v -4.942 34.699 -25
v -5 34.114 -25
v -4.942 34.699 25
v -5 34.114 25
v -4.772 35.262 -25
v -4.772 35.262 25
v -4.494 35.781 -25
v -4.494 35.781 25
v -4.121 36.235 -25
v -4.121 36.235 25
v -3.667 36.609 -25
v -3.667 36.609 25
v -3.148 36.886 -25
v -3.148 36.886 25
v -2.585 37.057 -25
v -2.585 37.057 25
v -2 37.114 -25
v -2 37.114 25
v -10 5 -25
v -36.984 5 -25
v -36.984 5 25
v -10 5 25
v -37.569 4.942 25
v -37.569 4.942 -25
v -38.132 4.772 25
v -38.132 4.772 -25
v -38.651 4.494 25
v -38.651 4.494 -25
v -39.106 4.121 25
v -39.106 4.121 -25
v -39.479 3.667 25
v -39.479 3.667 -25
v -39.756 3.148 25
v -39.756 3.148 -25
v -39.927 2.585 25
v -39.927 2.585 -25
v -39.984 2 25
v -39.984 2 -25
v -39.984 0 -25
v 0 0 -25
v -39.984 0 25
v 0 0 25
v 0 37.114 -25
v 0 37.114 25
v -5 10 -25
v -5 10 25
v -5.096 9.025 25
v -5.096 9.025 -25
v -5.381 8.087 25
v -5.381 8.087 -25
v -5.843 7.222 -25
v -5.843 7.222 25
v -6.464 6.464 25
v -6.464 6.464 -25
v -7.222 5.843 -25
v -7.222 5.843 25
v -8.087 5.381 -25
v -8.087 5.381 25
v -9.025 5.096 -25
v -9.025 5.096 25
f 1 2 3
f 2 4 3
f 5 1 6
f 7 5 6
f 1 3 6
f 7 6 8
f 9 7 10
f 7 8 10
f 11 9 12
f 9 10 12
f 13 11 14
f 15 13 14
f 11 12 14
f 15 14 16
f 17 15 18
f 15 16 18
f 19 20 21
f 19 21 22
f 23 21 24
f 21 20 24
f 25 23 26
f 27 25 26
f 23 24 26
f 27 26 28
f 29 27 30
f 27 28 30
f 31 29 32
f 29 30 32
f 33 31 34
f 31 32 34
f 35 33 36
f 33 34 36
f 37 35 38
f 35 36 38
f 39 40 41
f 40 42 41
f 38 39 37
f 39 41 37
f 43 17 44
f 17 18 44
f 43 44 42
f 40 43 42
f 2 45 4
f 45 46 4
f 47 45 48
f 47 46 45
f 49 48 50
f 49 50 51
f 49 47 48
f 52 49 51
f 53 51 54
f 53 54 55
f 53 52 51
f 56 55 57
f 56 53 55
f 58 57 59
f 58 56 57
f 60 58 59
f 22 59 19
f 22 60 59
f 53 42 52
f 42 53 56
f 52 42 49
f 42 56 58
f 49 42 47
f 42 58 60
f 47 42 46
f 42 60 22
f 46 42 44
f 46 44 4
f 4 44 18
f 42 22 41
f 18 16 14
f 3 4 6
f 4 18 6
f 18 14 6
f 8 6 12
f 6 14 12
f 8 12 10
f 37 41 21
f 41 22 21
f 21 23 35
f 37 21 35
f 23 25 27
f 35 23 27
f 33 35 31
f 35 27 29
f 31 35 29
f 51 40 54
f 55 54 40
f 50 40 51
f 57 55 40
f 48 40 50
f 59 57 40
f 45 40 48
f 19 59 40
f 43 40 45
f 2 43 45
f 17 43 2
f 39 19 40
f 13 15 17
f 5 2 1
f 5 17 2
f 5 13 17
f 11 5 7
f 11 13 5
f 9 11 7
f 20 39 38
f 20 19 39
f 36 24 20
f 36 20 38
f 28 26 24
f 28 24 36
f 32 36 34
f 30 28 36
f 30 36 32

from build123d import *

# Parameters (mm, degrees)
PAD_DEPTH   = 25
FILLET_R    = 3
FILLET001_R = 3
FILLET002_R = 5


with BuildPart() as part:
    # Sketch → Pad (new body, symmetric)
    with BuildSketch(Plane.XY):
        Polygon((0, 37.114174), (0, 0), (-39.984188, 0), (-39.984188, 5), (-5, 5), (-5, 37.114174), align=None)
    extrude(amount=PAD_DEPTH, both=True)

    # Fillet
    fillet_edges = [part.edges().sort_by_distance(p)[0] for p in [
        (-39.984188, 5, 0),
    ]]
    fillet(fillet_edges, radius=FILLET_R)

    # Fillet001
    fillet001_edges = [part.edges().sort_by_distance(p)[0] for p in [
        (-5, 37.114174, 0),
    ]]
    fillet(fillet001_edges, radius=FILLET001_R)

    # Fillet002
    fillet002_edges = [part.edges().sort_by_distance(p)[0] for p in [
        (-5, 5, 0),
    ]]
    fillet(fillet002_edges, radius=FILLET002_R)


solid = part.part
